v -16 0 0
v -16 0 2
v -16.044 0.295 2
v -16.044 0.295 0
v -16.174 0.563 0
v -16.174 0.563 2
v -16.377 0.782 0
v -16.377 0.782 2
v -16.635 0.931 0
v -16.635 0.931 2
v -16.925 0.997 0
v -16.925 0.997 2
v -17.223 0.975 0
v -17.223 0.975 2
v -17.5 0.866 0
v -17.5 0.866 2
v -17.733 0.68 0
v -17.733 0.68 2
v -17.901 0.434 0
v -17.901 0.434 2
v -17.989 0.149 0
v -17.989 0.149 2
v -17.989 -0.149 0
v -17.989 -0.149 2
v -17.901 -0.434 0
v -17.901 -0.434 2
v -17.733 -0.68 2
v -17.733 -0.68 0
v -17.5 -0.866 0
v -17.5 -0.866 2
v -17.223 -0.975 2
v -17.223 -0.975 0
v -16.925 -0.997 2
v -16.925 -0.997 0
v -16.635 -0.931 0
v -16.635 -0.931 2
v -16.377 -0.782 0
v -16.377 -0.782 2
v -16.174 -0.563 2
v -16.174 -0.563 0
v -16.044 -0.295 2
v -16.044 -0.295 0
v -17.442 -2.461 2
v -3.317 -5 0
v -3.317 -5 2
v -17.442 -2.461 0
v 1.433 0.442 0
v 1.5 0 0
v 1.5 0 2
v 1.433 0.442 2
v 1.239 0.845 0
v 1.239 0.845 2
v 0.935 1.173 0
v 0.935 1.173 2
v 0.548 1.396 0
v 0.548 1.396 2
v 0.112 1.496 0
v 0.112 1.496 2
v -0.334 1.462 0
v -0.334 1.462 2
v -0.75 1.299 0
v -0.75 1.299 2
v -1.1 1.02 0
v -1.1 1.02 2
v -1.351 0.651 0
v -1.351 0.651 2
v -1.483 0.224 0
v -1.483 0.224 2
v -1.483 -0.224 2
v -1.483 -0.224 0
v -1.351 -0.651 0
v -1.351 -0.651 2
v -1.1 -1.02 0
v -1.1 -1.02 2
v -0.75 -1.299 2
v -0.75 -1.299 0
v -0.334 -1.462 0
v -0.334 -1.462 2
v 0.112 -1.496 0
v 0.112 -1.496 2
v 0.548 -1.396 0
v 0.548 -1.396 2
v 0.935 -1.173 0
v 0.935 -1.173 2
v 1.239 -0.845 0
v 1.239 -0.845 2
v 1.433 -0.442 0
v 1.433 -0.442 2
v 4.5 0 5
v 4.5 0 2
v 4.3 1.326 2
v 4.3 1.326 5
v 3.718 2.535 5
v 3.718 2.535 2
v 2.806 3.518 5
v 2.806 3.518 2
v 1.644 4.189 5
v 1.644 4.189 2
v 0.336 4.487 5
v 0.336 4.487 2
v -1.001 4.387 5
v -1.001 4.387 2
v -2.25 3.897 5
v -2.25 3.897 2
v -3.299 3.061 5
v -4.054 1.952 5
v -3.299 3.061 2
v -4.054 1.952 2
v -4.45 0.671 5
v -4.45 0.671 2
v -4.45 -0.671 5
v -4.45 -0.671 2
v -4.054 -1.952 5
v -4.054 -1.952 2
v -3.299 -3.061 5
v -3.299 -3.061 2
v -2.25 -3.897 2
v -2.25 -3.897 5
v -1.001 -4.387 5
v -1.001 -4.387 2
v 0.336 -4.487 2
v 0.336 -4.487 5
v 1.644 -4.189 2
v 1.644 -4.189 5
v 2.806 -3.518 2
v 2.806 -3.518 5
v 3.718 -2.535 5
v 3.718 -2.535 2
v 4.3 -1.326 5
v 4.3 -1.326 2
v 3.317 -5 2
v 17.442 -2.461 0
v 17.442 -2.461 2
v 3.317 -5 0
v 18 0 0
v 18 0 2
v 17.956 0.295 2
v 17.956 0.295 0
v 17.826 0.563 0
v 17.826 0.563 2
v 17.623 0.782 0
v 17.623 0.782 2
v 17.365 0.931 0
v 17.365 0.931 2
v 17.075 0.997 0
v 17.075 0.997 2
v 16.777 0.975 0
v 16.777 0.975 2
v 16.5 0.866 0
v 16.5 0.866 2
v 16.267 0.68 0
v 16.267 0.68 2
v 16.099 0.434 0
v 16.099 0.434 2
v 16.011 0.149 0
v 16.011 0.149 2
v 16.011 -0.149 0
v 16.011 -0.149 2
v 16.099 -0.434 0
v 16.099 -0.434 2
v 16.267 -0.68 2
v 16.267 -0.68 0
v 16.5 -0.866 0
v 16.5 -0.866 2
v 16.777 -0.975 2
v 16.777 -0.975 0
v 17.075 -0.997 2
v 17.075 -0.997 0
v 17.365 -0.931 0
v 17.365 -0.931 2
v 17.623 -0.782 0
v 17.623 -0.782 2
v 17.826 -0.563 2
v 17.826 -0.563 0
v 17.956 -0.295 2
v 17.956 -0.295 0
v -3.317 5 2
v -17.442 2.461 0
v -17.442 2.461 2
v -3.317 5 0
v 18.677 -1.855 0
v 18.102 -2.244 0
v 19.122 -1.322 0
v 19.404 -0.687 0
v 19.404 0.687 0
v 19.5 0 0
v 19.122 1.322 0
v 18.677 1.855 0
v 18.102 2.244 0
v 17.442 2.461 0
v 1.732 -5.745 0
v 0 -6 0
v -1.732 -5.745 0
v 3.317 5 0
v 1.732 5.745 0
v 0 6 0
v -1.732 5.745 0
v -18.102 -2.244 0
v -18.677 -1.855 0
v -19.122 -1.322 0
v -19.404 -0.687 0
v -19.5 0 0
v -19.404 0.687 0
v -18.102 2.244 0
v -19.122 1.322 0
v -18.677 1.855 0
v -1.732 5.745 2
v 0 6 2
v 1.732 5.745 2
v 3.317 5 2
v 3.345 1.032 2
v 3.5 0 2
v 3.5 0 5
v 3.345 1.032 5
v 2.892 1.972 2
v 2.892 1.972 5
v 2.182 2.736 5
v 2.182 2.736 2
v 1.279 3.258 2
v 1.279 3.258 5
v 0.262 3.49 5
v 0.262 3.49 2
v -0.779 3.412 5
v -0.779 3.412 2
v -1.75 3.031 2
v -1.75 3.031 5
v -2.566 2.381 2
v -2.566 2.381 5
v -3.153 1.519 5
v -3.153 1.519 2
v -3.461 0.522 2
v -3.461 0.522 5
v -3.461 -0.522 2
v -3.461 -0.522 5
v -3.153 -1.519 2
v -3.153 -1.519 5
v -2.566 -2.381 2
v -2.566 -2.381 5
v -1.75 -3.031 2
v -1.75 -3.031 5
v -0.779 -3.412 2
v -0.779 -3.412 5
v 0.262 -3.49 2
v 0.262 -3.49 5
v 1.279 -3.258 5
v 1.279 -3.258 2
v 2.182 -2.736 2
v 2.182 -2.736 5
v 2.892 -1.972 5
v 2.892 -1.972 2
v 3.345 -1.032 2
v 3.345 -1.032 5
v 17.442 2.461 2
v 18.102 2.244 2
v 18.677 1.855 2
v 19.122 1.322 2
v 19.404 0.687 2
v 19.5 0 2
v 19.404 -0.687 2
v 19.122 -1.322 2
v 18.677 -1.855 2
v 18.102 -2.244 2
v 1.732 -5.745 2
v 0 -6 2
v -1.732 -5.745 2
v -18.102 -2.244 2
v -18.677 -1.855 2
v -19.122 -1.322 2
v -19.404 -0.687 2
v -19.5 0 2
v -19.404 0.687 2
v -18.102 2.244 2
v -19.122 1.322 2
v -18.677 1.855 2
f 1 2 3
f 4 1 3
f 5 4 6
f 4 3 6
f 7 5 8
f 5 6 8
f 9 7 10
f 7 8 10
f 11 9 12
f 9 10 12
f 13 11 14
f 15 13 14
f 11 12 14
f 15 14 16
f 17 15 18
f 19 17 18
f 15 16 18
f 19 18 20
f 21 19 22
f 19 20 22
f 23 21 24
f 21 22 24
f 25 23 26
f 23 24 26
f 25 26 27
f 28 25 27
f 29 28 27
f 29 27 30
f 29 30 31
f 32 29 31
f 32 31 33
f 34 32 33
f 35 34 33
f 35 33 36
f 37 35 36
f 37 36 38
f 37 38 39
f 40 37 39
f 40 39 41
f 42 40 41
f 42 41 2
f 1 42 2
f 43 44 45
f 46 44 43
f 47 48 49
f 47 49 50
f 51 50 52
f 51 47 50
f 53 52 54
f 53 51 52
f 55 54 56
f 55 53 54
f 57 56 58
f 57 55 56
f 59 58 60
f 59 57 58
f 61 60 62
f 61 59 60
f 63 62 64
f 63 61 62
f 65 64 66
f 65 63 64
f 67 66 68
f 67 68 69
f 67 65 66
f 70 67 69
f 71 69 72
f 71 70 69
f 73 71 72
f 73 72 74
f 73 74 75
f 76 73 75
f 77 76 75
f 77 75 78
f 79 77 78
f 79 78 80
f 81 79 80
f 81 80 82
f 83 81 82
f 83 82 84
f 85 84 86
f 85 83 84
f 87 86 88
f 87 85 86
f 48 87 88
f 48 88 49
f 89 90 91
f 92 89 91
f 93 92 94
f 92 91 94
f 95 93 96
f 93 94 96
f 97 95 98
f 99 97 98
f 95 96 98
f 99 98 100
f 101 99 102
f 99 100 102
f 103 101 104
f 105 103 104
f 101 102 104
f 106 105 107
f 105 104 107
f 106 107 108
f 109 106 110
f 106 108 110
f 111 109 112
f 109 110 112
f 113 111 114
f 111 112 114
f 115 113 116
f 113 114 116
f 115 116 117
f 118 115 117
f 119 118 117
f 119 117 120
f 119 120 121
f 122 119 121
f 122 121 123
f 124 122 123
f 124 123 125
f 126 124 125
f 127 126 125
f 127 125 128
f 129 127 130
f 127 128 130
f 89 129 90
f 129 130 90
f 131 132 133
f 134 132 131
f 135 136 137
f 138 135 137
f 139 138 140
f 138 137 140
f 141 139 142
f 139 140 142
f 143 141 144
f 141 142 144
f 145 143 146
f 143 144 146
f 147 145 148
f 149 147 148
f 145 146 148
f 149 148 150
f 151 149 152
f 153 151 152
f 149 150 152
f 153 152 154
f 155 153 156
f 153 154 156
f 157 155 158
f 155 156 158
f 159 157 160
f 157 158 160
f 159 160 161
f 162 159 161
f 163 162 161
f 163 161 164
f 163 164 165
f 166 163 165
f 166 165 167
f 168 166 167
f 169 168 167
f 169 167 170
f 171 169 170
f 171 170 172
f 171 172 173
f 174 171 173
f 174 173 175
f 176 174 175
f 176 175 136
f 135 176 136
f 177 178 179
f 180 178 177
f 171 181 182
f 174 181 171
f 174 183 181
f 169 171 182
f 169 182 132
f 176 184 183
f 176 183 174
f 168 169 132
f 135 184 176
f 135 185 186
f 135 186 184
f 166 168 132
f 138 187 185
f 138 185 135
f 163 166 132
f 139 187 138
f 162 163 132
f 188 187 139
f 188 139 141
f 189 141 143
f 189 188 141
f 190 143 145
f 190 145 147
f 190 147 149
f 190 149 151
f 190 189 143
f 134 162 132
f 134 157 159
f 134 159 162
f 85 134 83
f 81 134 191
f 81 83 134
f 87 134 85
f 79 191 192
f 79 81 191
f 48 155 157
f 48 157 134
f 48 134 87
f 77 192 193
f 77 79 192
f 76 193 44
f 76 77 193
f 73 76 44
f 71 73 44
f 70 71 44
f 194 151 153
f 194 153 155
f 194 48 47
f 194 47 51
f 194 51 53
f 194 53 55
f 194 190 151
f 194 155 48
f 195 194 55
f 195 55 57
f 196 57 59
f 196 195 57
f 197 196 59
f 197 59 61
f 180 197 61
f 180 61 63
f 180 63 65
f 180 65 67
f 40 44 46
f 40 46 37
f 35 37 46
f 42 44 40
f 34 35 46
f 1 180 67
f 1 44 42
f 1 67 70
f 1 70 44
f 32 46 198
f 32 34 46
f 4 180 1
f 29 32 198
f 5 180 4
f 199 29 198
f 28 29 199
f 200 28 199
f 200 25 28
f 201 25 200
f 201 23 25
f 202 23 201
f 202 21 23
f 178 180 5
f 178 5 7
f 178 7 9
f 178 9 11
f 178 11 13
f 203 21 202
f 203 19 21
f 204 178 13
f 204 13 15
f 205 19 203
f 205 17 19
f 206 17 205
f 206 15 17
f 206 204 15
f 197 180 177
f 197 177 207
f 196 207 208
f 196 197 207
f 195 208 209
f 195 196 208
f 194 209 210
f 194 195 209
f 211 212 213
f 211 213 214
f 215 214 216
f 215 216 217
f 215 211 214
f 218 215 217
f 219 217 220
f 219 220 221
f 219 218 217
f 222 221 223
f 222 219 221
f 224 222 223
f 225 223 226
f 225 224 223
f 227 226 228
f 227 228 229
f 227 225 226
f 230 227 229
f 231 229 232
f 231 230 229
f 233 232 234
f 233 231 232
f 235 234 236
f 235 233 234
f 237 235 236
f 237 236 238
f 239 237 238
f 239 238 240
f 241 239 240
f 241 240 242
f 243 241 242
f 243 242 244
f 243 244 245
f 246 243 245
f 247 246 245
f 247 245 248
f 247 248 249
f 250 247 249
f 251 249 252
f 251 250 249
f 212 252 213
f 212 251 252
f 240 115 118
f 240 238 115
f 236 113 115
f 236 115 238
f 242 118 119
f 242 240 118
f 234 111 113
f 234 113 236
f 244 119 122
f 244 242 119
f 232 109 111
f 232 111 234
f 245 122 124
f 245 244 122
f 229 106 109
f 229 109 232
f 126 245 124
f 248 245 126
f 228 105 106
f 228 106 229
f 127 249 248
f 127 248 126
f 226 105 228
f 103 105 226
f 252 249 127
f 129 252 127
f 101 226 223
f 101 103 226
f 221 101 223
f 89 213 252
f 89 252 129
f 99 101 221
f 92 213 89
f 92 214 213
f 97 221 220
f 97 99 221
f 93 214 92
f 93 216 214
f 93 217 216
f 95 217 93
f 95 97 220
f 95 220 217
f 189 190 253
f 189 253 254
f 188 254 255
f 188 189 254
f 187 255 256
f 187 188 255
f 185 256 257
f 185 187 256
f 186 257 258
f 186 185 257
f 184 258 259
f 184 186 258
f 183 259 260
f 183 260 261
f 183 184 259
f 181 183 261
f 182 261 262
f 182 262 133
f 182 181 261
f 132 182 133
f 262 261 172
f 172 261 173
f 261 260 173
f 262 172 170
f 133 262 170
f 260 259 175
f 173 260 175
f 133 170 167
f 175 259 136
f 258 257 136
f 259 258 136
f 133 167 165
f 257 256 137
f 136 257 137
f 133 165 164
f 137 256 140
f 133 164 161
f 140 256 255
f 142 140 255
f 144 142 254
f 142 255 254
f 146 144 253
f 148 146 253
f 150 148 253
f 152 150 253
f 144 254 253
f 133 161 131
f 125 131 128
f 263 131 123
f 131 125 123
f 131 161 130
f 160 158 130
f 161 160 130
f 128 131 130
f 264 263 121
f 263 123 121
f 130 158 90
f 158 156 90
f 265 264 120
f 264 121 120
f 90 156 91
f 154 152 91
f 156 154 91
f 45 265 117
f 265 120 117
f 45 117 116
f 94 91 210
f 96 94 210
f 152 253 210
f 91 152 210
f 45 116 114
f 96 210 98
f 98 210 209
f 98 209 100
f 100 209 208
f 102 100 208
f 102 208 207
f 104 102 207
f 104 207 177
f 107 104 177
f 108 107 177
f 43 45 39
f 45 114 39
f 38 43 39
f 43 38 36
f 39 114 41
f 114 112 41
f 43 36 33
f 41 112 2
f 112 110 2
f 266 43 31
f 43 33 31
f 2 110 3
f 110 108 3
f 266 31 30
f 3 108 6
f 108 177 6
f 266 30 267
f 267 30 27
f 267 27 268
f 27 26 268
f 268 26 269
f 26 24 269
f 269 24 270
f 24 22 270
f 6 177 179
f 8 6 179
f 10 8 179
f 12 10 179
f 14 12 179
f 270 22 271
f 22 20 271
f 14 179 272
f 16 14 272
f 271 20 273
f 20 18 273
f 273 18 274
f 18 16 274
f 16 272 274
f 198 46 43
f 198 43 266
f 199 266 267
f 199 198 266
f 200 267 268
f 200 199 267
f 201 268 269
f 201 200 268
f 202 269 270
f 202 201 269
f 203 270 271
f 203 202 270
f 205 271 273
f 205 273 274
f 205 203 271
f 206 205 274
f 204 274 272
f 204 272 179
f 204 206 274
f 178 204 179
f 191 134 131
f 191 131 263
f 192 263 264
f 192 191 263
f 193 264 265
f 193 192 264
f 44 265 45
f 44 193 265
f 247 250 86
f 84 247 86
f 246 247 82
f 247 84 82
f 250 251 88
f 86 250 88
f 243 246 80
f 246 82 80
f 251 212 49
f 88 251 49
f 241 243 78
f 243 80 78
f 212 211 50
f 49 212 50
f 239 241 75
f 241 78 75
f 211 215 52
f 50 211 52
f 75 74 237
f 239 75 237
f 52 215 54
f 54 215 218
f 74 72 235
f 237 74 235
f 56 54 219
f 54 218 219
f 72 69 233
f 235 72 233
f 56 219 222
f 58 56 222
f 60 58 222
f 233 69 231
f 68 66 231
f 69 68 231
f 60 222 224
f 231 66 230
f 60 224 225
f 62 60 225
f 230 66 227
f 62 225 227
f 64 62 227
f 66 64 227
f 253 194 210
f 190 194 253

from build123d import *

# Parameters (mm, degrees)
SKETCH1_R           = 1.5
BOSS_EXTRUDE1_DEPTH = 2
SKETCH2_R           = 4.5
SKETCH2_R_2         = 3.5
BOSS_EXTRUDE2_DEPTH = 3
SKETCH3_R           = 1
CUT_EXTRUDE1_DEPTH  = 3


with BuildPart() as part:
    # Sketch1 → Boss-Extrude1 (new body)
    with BuildSketch(Plane.XY):
        with BuildLine():
            Line((-17.442345164, 2.460554969), (-3.31662479, 5))
            ThreePointArc((-3.31662479, 5), (0, 6), (3.31662479, 5))
            Line((3.31662479, 5), (17.442345164, 2.460554969))
            ThreePointArc((17.442345164, 2.460554969), (19.5, 0), (17.442345164, -2.460554969))
            Line((17.442345164, -2.460554969), (3.31662479, -5))
            ThreePointArc((3.31662479, -5), (0, -6), (-3.31662479, -5))
            Line((-3.31662479, -5), (-17.442345164, -2.460554969))
            ThreePointArc((-17.442345164, -2.460554969), (-19.5, 0), (-17.442345164, 2.460554969))
        make_face()
        Circle(SKETCH1_R, mode=Mode.SUBTRACT)
    extrude(amount=BOSS_EXTRUDE1_DEPTH)

    # Sketch2 → Boss-Extrude2 (add)
    with BuildSketch(Plane.XY.offset(2)):
        Circle(SKETCH2_R)
        Circle(SKETCH2_R_2, mode=Mode.SUBTRACT)
    extrude(amount=BOSS_EXTRUDE2_DEPTH)

    # Sketch3 → Cut-Extrude1 (cut, through all)
    with BuildSketch(Plane.XY.offset(2)):
        with Locations((-17, 0)):
            Circle(SKETCH3_R)
        with Locations((17, 0)):
            Circle(SKETCH3_R)
    extrude(amount=-CUT_EXTRUDE1_DEPTH, mode=Mode.SUBTRACT)


solid = part.part
